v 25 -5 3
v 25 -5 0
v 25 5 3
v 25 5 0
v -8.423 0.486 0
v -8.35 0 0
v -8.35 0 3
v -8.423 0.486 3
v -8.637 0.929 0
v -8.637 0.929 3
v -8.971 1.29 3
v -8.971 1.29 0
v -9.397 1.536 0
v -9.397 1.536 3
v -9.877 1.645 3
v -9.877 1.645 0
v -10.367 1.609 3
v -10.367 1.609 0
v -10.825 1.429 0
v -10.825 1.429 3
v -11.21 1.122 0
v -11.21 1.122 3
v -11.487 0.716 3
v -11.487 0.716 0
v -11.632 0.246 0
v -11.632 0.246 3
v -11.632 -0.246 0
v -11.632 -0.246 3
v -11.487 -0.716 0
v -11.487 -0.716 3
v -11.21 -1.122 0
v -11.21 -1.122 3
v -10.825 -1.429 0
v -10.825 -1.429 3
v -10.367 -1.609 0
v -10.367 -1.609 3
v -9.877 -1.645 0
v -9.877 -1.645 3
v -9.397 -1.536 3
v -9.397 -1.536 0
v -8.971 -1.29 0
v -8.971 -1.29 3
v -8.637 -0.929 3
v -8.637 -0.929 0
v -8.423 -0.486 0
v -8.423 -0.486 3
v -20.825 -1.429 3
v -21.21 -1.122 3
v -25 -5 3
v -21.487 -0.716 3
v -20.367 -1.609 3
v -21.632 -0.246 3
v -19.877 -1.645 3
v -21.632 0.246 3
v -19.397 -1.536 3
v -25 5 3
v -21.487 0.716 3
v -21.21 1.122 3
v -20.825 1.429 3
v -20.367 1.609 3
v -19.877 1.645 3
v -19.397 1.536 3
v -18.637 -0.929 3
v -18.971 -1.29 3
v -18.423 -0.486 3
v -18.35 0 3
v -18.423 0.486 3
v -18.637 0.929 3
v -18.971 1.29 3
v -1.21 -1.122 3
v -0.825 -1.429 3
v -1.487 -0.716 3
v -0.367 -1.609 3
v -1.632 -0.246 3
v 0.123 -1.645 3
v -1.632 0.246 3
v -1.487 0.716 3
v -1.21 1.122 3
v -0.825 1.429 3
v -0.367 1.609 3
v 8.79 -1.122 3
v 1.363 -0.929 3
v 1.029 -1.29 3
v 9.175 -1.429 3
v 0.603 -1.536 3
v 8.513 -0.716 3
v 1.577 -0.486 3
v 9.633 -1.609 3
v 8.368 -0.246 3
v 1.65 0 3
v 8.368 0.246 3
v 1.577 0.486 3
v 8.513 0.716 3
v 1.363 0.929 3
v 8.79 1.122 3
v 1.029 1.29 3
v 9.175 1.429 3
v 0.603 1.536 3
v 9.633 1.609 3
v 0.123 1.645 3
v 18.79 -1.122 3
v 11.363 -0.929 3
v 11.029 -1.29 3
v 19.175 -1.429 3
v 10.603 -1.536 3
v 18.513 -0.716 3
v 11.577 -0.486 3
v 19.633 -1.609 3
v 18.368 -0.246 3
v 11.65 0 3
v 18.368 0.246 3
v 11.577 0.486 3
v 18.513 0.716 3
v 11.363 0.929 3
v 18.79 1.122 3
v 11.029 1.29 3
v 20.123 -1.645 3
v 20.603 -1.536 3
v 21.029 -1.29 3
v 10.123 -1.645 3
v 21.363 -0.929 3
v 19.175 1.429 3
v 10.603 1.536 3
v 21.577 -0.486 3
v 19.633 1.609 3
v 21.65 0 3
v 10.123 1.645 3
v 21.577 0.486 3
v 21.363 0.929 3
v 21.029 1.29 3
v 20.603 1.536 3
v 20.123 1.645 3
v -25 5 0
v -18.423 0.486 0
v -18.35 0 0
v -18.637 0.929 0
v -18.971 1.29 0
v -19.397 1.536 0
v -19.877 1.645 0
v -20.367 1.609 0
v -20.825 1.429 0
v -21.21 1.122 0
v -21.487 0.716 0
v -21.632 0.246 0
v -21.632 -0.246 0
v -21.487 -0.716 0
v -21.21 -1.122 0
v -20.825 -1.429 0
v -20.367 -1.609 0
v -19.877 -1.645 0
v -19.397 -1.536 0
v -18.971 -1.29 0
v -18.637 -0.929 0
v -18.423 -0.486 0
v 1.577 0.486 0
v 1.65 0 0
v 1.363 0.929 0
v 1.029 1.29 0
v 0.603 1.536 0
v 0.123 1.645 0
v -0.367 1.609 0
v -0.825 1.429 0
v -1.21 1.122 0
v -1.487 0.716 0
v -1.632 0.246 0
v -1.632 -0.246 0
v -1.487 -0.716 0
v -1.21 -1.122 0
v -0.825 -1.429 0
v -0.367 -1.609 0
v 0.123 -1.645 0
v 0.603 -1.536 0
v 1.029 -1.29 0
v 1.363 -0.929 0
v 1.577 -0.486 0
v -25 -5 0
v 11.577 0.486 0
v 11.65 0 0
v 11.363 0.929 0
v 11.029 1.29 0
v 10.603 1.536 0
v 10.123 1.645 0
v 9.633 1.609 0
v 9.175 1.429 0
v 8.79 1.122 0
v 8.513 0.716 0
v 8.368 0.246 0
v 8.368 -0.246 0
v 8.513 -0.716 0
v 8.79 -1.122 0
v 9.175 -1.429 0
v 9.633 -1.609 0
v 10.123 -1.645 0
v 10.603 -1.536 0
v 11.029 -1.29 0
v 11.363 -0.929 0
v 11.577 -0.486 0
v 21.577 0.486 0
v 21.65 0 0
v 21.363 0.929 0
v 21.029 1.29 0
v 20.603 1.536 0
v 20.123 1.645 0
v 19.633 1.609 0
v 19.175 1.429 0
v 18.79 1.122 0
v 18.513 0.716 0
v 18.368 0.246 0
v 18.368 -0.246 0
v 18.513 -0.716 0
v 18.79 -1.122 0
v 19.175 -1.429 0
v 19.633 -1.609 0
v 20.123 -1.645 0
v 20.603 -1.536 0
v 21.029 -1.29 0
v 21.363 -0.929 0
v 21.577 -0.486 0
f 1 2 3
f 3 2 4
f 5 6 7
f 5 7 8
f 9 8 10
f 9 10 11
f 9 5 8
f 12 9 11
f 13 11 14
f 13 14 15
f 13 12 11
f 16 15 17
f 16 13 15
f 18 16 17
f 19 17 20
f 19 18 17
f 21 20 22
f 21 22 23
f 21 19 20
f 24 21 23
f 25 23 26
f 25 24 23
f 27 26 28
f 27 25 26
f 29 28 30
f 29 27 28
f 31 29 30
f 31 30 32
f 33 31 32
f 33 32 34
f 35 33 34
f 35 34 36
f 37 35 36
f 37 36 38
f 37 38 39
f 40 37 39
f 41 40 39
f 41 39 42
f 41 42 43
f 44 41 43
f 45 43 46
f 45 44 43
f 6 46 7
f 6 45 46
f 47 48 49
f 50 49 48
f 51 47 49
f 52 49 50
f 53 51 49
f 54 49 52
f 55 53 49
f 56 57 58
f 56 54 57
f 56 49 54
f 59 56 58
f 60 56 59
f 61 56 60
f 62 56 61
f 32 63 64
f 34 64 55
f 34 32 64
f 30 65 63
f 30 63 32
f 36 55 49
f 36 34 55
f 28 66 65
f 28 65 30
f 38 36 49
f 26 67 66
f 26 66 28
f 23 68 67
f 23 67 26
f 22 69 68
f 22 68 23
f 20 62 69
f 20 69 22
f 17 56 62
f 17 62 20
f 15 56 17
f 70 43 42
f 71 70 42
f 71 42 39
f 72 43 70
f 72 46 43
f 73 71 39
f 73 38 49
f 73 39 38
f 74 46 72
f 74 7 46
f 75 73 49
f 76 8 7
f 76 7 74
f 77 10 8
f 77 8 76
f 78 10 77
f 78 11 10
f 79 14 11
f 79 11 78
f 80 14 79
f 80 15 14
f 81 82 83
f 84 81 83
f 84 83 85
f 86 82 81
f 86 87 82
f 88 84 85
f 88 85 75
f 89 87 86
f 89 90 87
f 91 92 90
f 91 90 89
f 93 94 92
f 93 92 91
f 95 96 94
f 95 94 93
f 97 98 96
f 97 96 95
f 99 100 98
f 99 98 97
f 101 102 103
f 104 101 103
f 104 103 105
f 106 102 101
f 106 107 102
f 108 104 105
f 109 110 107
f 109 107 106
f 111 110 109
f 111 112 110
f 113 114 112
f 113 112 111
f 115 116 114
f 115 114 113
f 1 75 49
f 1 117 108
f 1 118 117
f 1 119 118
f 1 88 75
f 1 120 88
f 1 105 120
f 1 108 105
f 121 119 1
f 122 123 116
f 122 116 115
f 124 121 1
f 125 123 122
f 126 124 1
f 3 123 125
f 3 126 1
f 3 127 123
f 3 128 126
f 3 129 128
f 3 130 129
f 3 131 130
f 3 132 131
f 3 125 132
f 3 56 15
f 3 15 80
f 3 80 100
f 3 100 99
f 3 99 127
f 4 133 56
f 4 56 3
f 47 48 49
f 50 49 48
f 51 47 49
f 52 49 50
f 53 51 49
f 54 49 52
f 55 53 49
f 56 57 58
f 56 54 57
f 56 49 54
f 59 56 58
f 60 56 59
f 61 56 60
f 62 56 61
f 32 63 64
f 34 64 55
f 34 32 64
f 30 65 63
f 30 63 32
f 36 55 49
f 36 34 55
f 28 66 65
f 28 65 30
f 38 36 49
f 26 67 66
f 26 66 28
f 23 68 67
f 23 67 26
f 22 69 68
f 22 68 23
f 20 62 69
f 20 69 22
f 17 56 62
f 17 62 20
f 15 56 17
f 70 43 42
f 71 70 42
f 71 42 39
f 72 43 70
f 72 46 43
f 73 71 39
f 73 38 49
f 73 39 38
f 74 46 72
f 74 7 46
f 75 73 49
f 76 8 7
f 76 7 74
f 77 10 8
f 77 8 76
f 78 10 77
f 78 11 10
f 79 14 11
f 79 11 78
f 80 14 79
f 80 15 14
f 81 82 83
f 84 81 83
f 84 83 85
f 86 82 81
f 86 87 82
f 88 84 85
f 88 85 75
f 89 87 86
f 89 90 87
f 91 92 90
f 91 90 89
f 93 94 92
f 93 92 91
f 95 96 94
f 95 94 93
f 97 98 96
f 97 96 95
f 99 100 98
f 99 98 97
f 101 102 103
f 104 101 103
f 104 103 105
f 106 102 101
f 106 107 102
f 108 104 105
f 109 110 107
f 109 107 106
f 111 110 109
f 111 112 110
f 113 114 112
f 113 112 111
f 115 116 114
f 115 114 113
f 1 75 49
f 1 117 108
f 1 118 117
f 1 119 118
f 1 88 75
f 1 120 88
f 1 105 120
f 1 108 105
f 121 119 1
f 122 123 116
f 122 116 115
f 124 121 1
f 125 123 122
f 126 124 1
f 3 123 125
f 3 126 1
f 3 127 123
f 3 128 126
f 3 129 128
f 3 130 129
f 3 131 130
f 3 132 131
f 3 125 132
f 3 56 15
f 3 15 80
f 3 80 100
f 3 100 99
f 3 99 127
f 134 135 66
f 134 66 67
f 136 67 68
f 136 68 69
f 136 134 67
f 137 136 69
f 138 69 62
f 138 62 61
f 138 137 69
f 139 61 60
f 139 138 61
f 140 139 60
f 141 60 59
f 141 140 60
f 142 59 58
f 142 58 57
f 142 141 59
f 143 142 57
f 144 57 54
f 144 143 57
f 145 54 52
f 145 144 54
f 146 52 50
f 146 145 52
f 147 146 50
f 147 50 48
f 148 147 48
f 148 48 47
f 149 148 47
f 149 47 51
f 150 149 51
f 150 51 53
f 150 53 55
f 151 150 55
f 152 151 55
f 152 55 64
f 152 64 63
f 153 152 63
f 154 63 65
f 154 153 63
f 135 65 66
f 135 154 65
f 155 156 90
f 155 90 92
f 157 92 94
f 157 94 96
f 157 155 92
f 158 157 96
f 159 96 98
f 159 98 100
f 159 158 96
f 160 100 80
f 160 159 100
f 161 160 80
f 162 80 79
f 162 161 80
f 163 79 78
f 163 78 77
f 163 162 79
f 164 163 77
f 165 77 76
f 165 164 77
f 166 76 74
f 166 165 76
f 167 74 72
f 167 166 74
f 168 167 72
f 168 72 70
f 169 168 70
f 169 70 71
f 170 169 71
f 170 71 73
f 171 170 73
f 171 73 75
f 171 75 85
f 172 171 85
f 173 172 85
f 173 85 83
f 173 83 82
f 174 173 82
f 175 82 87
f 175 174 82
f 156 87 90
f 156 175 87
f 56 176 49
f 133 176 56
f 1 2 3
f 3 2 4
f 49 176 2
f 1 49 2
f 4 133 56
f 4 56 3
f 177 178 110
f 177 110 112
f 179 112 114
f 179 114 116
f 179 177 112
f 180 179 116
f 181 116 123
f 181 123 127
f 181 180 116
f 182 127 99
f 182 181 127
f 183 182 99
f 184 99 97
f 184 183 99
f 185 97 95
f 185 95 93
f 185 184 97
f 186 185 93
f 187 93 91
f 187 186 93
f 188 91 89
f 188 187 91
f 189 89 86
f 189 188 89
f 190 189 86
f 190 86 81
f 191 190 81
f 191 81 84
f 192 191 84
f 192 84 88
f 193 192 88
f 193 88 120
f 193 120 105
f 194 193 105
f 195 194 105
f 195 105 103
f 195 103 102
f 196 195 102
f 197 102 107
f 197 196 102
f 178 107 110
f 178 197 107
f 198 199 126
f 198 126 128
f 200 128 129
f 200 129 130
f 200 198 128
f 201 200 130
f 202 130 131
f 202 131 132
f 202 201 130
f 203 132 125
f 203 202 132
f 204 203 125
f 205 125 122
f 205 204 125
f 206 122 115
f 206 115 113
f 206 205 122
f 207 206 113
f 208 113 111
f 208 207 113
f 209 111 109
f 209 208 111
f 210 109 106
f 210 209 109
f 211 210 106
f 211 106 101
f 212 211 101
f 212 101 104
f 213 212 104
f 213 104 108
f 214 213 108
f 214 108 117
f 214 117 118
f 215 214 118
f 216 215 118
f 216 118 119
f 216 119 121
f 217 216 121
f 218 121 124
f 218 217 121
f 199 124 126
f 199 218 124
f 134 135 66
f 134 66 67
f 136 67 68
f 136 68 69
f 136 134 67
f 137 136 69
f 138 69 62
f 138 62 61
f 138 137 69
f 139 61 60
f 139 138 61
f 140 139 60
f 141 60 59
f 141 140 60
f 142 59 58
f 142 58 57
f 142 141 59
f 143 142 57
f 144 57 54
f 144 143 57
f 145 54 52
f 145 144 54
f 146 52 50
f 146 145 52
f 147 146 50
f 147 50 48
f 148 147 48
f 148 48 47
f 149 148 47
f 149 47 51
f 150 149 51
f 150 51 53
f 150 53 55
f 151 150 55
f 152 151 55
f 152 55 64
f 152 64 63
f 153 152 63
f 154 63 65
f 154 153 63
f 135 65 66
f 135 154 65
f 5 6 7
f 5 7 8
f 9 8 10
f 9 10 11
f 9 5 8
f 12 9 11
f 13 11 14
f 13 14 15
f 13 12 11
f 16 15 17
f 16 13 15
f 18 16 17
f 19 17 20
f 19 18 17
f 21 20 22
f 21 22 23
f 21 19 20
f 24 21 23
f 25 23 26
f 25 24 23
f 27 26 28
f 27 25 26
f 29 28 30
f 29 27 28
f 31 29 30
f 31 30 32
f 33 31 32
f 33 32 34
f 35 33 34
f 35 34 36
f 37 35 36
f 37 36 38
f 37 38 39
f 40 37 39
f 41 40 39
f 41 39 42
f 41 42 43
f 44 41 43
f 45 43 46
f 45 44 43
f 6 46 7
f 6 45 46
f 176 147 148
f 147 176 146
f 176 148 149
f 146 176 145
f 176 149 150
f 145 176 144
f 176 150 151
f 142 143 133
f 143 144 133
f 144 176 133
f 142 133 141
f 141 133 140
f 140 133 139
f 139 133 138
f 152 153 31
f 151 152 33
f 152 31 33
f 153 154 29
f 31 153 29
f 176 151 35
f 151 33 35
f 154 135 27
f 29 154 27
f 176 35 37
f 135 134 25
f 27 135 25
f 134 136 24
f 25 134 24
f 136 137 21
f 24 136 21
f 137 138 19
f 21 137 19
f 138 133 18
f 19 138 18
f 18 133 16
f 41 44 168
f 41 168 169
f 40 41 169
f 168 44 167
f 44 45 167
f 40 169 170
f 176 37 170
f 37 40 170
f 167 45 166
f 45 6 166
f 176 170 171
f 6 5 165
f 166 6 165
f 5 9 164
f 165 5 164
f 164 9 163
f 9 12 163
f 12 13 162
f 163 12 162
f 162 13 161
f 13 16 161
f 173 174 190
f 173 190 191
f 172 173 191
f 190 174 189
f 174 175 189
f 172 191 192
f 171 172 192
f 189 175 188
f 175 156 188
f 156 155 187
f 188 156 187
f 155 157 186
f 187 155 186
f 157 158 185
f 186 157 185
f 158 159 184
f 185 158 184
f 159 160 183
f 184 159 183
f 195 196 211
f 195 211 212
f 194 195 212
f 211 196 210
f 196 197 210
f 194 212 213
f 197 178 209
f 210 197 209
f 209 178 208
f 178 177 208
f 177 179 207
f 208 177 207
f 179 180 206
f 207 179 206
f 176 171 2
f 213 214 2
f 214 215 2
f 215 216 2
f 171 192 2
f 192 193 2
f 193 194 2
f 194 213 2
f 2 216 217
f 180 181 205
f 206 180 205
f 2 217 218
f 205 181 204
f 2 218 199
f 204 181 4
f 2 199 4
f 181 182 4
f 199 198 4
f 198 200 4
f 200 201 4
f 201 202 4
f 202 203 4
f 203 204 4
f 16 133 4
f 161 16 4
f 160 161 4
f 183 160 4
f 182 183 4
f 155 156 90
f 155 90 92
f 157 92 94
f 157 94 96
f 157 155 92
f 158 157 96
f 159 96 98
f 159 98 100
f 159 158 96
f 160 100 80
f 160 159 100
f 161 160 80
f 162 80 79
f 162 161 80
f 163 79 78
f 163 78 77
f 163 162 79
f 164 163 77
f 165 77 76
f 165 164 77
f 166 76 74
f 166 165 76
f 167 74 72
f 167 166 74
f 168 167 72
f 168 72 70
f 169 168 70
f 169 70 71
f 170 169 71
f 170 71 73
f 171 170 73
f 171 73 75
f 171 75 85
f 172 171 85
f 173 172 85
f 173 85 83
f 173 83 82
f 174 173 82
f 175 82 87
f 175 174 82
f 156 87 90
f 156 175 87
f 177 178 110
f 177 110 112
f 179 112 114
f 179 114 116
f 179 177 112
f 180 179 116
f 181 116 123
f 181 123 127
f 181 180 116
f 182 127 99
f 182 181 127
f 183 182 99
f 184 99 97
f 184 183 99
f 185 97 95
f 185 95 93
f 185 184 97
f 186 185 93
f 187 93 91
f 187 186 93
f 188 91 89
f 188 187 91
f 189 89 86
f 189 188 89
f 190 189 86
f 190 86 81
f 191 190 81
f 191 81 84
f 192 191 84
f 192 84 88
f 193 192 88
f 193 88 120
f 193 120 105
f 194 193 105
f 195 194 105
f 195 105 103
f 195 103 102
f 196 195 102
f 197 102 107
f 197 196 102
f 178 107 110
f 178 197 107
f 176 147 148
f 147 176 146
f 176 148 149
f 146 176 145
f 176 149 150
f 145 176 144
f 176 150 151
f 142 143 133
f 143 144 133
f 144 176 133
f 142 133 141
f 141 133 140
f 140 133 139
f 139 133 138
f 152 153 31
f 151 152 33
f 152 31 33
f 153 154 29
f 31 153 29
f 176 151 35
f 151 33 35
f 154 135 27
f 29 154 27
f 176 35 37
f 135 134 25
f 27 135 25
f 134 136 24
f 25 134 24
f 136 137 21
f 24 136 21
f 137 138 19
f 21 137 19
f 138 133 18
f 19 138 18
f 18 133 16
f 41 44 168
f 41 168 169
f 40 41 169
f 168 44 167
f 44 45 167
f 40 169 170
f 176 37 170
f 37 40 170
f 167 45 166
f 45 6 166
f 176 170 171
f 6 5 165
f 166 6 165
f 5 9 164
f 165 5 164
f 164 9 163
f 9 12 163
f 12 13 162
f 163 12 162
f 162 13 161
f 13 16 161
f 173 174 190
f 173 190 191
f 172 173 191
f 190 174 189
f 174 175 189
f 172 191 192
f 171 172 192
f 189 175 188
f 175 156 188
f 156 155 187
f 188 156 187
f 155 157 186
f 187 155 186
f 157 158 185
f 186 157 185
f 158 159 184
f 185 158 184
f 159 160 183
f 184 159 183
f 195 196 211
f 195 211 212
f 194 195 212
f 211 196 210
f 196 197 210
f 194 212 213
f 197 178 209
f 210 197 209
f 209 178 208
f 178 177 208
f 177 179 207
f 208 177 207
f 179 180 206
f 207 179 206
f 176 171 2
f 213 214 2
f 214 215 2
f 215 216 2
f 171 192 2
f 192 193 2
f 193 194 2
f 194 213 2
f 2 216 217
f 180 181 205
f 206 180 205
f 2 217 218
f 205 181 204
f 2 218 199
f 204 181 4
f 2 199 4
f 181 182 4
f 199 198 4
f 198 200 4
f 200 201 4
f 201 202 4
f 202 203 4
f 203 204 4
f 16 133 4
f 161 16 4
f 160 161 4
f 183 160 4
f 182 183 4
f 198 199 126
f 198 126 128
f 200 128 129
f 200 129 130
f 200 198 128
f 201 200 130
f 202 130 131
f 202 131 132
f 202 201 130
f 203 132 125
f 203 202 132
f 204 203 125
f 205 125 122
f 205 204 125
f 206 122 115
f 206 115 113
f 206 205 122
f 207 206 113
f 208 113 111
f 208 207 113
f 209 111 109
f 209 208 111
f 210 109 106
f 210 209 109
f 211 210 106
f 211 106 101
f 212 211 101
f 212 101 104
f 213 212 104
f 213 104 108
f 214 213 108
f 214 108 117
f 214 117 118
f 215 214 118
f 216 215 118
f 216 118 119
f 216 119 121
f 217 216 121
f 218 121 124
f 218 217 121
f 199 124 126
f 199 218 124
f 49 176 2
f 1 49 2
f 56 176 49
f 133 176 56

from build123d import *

# Parameters (mm, degrees)
SKETCH_W         = 50
SKETCH_H         = 10
SKETCH_R         = 1.65
EXTRUDE_DEPTH    = 3
EXTRUDE001_DEPTH = 3


with BuildPart() as extrude_body:
    # Sketch → Extrude (new body)
    with BuildSketch(Plane.XY):
        Rectangle(SKETCH_W, SKETCH_H)
        Circle(SKETCH_R, mode=Mode.SUBTRACT)
        with Locations((-10, 0)):
            Circle(SKETCH_R, mode=Mode.SUBTRACT)
        with Locations((-20, 0)):
            Circle(SKETCH_R, mode=Mode.SUBTRACT)
        with Locations((10, 0)):
            Circle(SKETCH_R, mode=Mode.SUBTRACT)
        with Locations((20, 0)):
            Circle(SKETCH_R, mode=Mode.SUBTRACT)
    extrude(amount=EXTRUDE_DEPTH)


with BuildPart() as extrude001:
    # Sketch → Extrude001 (new body)
    with BuildSketch(Plane.XY):
        Rectangle(SKETCH_W, SKETCH_H)
        Circle(SKETCH_R, mode=Mode.SUBTRACT)
        with Locations((-10, 0)):
            Circle(SKETCH_R, mode=Mode.SUBTRACT)
        with Locations((-20, 0)):
            Circle(SKETCH_R, mode=Mode.SUBTRACT)
        with Locations((10, 0)):
            Circle(SKETCH_R, mode=Mode.SUBTRACT)
        with Locations((20, 0)):
            Circle(SKETCH_R, mode=Mode.SUBTRACT)
    extrude(amount=EXTRUDE001_DEPTH)


solid = Compound([extrude_body.part, extrude001.part])
